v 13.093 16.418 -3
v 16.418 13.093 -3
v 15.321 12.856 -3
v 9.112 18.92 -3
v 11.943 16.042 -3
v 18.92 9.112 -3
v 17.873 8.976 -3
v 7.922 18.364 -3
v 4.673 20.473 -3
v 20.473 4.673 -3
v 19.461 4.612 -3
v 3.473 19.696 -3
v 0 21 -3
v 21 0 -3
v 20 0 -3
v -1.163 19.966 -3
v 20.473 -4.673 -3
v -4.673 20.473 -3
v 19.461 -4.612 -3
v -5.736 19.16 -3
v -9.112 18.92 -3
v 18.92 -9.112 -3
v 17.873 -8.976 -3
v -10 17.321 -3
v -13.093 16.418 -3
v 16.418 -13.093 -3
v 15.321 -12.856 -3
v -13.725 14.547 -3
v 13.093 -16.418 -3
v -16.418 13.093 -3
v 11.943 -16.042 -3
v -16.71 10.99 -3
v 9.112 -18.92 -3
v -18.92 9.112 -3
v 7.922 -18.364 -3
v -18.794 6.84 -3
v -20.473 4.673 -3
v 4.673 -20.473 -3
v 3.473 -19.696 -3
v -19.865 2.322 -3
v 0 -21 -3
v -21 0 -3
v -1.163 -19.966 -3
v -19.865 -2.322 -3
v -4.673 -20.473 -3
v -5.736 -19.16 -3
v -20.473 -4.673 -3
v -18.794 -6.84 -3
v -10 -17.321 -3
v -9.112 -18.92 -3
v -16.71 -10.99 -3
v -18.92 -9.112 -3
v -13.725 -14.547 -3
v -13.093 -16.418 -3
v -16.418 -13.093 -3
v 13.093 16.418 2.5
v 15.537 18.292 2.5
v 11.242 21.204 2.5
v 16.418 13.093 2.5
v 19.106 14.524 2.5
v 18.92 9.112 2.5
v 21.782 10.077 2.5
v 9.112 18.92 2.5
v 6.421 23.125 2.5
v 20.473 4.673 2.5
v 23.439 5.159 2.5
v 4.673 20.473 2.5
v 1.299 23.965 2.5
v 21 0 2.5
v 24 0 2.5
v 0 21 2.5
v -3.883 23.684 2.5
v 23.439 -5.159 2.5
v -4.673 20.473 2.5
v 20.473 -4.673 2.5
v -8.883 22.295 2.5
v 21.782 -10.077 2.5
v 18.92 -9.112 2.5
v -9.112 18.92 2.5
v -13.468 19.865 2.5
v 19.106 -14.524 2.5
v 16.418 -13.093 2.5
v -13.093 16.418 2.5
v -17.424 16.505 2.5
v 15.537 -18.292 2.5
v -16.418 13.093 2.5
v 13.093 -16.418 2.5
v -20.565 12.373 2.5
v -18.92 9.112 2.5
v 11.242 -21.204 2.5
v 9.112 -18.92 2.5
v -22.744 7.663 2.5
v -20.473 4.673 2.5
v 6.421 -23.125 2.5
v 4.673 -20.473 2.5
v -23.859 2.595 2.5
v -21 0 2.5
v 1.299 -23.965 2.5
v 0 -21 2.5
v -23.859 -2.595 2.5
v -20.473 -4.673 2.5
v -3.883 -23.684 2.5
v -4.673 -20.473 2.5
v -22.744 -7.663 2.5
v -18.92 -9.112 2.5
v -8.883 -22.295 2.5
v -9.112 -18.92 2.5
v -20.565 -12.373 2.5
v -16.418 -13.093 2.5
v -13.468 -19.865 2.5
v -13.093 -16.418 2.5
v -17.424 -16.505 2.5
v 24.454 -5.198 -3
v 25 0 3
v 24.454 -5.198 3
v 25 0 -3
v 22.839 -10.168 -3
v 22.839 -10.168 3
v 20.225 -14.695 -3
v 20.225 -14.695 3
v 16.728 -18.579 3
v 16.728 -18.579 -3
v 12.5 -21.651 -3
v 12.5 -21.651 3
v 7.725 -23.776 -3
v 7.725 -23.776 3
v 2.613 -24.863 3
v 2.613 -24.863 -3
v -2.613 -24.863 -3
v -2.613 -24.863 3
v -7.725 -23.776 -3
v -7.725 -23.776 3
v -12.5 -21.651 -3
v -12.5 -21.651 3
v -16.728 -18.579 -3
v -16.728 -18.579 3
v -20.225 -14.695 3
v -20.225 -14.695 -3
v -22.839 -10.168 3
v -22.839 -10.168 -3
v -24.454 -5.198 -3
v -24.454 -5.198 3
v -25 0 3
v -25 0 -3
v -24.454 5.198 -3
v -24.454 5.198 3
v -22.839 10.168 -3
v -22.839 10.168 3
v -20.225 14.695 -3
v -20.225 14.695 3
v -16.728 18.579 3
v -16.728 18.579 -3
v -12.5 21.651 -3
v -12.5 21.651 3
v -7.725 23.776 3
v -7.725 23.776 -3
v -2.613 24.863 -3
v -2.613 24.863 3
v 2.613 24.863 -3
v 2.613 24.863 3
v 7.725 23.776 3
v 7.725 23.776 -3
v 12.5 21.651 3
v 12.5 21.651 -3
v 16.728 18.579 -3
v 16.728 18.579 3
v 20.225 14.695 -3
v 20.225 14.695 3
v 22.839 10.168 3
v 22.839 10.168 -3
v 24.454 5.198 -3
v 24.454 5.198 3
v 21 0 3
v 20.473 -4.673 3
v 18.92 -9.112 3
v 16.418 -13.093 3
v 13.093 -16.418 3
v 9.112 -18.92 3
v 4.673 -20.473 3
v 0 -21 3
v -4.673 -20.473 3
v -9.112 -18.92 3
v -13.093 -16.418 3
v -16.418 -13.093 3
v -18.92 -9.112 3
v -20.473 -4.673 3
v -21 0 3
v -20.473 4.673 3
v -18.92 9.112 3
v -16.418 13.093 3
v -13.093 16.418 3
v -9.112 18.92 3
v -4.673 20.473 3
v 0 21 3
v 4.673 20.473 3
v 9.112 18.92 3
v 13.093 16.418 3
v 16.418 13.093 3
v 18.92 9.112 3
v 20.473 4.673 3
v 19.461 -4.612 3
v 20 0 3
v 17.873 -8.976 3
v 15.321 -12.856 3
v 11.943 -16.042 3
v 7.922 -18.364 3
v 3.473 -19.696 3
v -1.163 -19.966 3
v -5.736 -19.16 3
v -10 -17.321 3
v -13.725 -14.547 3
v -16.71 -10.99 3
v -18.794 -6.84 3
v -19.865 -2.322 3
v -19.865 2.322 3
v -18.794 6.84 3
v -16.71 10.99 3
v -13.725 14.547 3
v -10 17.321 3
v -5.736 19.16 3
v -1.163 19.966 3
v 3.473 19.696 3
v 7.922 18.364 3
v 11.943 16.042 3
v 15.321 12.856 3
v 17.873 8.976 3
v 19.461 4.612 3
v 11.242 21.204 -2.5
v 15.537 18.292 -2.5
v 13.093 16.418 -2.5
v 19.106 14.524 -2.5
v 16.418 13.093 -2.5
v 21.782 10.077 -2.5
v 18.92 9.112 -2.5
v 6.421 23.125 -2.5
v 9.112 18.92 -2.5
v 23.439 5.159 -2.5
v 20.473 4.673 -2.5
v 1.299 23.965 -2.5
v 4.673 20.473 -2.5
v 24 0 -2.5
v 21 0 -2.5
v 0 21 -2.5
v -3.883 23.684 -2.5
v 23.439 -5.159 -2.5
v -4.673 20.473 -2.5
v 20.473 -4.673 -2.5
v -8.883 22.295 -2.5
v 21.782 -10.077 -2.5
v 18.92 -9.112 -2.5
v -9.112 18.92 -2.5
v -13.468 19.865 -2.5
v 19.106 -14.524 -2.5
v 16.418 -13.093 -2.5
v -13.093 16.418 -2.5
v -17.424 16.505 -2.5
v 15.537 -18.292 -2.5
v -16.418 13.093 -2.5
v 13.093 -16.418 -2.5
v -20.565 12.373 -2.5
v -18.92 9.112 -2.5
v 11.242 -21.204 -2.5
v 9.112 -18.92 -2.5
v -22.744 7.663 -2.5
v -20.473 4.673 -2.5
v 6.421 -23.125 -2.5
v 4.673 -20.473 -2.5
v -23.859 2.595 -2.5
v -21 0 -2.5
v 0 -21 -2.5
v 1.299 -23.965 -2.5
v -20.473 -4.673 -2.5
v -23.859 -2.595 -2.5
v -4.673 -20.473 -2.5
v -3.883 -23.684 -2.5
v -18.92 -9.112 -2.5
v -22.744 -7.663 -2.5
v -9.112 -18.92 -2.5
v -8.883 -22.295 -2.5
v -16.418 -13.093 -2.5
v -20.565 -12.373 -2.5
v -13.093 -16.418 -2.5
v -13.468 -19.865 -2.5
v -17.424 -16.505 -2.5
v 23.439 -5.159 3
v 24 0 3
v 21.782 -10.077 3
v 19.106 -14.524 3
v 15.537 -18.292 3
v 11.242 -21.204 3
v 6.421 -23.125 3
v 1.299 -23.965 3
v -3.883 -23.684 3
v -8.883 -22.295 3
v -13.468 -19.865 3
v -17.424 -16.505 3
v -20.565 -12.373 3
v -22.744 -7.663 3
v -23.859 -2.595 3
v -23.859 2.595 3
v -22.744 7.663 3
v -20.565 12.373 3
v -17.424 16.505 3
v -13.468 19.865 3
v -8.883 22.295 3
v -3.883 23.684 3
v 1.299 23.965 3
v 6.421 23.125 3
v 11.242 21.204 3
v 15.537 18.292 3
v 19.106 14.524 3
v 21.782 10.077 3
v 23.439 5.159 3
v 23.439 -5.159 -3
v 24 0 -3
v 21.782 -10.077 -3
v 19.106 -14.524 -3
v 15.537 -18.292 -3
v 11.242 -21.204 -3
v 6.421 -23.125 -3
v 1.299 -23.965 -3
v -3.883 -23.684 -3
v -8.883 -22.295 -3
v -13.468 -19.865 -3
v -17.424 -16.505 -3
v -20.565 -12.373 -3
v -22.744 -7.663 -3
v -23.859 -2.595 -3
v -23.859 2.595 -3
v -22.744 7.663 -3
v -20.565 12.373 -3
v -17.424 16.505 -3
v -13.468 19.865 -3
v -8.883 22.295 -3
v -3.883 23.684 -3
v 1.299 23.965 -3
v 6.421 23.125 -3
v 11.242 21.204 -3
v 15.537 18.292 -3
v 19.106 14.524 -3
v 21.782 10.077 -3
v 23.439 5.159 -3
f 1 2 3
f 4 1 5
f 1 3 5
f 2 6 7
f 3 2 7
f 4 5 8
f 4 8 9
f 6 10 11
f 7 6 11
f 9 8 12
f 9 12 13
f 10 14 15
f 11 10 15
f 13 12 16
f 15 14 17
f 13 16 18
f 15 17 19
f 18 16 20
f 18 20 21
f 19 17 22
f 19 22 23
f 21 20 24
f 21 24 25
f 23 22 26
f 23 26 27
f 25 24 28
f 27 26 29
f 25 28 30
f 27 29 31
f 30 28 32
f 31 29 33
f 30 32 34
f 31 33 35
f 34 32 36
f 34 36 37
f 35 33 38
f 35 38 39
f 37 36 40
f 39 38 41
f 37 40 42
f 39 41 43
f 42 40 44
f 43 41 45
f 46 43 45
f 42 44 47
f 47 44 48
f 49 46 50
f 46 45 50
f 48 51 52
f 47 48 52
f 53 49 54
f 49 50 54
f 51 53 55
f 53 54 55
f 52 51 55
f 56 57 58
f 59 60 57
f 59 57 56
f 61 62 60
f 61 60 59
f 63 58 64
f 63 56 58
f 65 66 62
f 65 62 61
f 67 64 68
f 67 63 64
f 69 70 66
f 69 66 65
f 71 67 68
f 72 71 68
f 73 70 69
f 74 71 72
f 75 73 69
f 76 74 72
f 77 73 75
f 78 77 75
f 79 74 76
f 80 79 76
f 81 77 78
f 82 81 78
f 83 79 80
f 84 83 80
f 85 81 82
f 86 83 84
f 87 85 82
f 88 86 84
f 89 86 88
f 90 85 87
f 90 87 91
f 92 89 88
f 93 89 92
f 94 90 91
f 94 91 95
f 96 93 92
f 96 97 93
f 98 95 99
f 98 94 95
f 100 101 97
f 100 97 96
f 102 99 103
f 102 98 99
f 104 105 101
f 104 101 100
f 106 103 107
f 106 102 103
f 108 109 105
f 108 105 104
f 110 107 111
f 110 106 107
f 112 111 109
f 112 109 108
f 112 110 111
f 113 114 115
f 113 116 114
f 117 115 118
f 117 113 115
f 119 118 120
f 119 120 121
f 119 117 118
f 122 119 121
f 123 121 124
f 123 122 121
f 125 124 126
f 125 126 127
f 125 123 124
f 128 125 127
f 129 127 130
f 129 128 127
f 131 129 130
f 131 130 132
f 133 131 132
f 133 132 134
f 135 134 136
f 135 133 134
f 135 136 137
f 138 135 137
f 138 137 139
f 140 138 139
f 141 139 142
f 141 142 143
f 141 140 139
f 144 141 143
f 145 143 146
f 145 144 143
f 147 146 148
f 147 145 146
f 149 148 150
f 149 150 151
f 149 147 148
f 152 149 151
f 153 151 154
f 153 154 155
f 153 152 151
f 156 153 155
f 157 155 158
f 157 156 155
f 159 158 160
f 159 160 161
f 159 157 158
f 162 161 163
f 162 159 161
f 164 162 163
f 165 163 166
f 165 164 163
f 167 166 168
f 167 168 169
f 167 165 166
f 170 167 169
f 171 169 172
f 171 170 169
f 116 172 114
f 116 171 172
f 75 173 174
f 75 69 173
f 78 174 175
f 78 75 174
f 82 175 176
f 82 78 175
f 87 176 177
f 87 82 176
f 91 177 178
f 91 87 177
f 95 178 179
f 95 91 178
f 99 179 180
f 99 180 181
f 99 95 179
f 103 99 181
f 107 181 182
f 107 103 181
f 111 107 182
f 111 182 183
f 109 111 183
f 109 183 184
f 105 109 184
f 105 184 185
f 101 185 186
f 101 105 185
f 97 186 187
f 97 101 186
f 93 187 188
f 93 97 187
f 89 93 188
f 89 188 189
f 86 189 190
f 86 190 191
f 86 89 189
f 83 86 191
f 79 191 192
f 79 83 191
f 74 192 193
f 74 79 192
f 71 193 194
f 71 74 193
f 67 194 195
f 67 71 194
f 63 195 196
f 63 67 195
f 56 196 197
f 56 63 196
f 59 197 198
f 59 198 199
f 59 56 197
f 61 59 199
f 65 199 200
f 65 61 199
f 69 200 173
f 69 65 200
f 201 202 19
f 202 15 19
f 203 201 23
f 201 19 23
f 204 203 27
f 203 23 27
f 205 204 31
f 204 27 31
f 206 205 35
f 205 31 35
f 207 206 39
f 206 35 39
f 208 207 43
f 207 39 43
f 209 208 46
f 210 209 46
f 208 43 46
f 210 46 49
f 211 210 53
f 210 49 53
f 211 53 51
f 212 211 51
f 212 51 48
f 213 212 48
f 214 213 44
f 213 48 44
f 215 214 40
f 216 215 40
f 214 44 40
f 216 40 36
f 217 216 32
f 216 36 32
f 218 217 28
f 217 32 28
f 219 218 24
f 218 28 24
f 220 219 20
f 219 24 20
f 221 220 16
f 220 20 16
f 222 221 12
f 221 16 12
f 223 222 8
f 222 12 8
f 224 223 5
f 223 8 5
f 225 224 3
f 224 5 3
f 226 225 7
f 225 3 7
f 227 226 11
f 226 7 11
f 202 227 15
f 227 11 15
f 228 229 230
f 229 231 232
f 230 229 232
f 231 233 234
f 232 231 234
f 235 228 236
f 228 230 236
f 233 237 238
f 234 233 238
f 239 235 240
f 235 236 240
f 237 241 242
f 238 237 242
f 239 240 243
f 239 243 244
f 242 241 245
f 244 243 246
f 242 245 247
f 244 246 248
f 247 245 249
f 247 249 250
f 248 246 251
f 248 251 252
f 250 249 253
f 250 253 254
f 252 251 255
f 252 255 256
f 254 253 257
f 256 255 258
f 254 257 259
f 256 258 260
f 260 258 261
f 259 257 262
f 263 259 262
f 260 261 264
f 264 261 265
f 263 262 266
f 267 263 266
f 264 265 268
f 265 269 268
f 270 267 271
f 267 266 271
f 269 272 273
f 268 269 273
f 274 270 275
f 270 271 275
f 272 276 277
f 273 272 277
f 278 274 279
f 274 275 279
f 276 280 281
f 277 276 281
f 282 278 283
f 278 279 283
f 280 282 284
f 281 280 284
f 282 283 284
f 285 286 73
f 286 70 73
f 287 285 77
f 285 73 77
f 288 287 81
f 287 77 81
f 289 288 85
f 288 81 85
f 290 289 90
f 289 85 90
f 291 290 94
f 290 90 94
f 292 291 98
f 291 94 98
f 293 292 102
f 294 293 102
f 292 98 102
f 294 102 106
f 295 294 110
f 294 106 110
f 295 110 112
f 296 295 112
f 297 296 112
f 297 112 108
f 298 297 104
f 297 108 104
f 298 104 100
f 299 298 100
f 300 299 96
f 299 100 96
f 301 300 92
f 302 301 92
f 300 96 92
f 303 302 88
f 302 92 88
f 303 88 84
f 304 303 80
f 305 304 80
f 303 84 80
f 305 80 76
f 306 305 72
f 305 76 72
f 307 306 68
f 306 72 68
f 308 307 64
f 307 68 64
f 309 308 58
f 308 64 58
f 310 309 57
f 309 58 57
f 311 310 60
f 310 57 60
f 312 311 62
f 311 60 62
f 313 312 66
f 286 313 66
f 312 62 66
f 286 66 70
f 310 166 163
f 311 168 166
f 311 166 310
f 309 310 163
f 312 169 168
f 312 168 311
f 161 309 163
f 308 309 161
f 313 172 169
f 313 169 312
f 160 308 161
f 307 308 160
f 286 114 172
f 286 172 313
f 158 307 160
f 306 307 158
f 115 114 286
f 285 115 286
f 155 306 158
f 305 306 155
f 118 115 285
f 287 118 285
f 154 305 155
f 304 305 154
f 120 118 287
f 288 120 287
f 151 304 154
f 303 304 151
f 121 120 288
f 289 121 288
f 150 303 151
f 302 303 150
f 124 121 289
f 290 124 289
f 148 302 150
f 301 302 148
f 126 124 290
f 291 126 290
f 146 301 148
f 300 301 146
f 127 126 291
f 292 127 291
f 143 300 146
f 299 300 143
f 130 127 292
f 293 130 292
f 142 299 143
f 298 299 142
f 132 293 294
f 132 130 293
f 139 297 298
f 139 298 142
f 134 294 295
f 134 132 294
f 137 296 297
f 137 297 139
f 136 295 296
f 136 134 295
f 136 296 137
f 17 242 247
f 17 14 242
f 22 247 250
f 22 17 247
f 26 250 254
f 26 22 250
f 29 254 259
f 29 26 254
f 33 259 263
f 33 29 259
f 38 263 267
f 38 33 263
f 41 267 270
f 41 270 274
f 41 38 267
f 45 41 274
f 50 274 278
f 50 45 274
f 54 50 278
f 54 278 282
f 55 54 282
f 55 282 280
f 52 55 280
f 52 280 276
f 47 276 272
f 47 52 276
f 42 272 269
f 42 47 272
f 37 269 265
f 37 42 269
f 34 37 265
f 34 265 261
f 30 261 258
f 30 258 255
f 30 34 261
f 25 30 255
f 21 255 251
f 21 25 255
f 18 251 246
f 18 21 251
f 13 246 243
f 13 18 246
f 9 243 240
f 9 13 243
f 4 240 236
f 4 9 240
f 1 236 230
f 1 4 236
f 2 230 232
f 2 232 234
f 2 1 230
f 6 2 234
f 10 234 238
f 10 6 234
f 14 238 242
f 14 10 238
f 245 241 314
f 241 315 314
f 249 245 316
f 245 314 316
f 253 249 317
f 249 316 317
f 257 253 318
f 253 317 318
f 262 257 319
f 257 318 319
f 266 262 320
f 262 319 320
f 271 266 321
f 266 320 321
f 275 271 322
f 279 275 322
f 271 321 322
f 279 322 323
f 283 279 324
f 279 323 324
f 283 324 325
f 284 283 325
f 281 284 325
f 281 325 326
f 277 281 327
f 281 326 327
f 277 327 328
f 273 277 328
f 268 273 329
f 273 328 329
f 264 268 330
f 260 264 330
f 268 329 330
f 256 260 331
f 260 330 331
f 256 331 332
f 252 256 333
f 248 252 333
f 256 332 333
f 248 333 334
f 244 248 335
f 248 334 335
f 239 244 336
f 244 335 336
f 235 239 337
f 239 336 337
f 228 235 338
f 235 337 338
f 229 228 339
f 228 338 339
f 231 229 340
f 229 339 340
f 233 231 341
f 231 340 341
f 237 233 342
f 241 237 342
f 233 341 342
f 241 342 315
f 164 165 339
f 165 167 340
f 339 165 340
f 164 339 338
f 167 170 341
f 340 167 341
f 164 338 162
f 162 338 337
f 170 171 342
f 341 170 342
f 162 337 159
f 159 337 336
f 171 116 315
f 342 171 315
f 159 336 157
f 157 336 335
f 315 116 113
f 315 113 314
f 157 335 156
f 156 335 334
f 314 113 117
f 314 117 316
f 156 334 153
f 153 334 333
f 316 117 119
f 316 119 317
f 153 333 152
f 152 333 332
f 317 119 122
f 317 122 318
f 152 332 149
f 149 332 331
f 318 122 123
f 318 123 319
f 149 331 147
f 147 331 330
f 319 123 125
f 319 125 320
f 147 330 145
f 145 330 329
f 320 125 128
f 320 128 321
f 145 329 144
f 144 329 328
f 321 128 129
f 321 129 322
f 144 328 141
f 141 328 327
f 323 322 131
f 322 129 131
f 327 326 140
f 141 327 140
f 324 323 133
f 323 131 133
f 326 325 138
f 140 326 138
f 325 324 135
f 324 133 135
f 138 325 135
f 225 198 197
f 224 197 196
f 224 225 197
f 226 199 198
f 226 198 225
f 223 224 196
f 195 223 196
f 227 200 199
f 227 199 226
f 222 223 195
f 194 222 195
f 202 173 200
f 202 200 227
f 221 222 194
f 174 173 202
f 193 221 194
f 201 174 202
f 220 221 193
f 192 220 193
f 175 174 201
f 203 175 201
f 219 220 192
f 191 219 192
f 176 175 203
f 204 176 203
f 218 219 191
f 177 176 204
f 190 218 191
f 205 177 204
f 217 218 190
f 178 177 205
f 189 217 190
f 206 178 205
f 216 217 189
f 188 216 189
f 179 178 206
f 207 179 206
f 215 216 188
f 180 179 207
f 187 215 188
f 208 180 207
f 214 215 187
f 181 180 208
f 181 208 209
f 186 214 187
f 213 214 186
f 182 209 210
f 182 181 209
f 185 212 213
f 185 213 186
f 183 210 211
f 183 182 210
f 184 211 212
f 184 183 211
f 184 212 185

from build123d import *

# Parameters (mm, degrees)
SKETCH1_W = 6
SKETCH1_H = 5
SKETCH3_W = 0.5
SKETCH3_H = 3


with BuildPart() as part:
    # Sketch1 → Revolve1 (revolve)
    with BuildSketch(Plane(origin=(0, 0, 0), x_dir=(0, 0, -1), z_dir=(1, 0, 0)), mode=Mode.PRIVATE) as revolve1_sk:
        with Locations((0, 22.5)):
            Rectangle(SKETCH1_W, SKETCH1_H)
    revolve(revolve1_sk.sketch.rotate(Axis((0, 0, 0), (0, 0, -1)), 90), axis=Axis((0, 0, 0), (0, 0, -1)))

    # Sketch3 → Cut-Revolve2 (revolve, cut)
    with BuildSketch(Plane(origin=(0, 0, 0), x_dir=(0, 0, -1), z_dir=(1, 0, 0)), mode=Mode.PRIVATE) as cut_revolve2_sk:
        with Locations((2.75, 22.5)):
            Rectangle(SKETCH3_W, SKETCH3_H)
        with Locations((-2.75, 22.5)):
            Rectangle(SKETCH3_W, SKETCH3_H)
    revolve(cut_revolve2_sk.sketch.rotate(Axis((0, 0, 0), (0, 0, -1)), 90), axis=Axis((0, 0, 0), (0, 0, -1)), mode=Mode.SUBTRACT)


solid = part.part
